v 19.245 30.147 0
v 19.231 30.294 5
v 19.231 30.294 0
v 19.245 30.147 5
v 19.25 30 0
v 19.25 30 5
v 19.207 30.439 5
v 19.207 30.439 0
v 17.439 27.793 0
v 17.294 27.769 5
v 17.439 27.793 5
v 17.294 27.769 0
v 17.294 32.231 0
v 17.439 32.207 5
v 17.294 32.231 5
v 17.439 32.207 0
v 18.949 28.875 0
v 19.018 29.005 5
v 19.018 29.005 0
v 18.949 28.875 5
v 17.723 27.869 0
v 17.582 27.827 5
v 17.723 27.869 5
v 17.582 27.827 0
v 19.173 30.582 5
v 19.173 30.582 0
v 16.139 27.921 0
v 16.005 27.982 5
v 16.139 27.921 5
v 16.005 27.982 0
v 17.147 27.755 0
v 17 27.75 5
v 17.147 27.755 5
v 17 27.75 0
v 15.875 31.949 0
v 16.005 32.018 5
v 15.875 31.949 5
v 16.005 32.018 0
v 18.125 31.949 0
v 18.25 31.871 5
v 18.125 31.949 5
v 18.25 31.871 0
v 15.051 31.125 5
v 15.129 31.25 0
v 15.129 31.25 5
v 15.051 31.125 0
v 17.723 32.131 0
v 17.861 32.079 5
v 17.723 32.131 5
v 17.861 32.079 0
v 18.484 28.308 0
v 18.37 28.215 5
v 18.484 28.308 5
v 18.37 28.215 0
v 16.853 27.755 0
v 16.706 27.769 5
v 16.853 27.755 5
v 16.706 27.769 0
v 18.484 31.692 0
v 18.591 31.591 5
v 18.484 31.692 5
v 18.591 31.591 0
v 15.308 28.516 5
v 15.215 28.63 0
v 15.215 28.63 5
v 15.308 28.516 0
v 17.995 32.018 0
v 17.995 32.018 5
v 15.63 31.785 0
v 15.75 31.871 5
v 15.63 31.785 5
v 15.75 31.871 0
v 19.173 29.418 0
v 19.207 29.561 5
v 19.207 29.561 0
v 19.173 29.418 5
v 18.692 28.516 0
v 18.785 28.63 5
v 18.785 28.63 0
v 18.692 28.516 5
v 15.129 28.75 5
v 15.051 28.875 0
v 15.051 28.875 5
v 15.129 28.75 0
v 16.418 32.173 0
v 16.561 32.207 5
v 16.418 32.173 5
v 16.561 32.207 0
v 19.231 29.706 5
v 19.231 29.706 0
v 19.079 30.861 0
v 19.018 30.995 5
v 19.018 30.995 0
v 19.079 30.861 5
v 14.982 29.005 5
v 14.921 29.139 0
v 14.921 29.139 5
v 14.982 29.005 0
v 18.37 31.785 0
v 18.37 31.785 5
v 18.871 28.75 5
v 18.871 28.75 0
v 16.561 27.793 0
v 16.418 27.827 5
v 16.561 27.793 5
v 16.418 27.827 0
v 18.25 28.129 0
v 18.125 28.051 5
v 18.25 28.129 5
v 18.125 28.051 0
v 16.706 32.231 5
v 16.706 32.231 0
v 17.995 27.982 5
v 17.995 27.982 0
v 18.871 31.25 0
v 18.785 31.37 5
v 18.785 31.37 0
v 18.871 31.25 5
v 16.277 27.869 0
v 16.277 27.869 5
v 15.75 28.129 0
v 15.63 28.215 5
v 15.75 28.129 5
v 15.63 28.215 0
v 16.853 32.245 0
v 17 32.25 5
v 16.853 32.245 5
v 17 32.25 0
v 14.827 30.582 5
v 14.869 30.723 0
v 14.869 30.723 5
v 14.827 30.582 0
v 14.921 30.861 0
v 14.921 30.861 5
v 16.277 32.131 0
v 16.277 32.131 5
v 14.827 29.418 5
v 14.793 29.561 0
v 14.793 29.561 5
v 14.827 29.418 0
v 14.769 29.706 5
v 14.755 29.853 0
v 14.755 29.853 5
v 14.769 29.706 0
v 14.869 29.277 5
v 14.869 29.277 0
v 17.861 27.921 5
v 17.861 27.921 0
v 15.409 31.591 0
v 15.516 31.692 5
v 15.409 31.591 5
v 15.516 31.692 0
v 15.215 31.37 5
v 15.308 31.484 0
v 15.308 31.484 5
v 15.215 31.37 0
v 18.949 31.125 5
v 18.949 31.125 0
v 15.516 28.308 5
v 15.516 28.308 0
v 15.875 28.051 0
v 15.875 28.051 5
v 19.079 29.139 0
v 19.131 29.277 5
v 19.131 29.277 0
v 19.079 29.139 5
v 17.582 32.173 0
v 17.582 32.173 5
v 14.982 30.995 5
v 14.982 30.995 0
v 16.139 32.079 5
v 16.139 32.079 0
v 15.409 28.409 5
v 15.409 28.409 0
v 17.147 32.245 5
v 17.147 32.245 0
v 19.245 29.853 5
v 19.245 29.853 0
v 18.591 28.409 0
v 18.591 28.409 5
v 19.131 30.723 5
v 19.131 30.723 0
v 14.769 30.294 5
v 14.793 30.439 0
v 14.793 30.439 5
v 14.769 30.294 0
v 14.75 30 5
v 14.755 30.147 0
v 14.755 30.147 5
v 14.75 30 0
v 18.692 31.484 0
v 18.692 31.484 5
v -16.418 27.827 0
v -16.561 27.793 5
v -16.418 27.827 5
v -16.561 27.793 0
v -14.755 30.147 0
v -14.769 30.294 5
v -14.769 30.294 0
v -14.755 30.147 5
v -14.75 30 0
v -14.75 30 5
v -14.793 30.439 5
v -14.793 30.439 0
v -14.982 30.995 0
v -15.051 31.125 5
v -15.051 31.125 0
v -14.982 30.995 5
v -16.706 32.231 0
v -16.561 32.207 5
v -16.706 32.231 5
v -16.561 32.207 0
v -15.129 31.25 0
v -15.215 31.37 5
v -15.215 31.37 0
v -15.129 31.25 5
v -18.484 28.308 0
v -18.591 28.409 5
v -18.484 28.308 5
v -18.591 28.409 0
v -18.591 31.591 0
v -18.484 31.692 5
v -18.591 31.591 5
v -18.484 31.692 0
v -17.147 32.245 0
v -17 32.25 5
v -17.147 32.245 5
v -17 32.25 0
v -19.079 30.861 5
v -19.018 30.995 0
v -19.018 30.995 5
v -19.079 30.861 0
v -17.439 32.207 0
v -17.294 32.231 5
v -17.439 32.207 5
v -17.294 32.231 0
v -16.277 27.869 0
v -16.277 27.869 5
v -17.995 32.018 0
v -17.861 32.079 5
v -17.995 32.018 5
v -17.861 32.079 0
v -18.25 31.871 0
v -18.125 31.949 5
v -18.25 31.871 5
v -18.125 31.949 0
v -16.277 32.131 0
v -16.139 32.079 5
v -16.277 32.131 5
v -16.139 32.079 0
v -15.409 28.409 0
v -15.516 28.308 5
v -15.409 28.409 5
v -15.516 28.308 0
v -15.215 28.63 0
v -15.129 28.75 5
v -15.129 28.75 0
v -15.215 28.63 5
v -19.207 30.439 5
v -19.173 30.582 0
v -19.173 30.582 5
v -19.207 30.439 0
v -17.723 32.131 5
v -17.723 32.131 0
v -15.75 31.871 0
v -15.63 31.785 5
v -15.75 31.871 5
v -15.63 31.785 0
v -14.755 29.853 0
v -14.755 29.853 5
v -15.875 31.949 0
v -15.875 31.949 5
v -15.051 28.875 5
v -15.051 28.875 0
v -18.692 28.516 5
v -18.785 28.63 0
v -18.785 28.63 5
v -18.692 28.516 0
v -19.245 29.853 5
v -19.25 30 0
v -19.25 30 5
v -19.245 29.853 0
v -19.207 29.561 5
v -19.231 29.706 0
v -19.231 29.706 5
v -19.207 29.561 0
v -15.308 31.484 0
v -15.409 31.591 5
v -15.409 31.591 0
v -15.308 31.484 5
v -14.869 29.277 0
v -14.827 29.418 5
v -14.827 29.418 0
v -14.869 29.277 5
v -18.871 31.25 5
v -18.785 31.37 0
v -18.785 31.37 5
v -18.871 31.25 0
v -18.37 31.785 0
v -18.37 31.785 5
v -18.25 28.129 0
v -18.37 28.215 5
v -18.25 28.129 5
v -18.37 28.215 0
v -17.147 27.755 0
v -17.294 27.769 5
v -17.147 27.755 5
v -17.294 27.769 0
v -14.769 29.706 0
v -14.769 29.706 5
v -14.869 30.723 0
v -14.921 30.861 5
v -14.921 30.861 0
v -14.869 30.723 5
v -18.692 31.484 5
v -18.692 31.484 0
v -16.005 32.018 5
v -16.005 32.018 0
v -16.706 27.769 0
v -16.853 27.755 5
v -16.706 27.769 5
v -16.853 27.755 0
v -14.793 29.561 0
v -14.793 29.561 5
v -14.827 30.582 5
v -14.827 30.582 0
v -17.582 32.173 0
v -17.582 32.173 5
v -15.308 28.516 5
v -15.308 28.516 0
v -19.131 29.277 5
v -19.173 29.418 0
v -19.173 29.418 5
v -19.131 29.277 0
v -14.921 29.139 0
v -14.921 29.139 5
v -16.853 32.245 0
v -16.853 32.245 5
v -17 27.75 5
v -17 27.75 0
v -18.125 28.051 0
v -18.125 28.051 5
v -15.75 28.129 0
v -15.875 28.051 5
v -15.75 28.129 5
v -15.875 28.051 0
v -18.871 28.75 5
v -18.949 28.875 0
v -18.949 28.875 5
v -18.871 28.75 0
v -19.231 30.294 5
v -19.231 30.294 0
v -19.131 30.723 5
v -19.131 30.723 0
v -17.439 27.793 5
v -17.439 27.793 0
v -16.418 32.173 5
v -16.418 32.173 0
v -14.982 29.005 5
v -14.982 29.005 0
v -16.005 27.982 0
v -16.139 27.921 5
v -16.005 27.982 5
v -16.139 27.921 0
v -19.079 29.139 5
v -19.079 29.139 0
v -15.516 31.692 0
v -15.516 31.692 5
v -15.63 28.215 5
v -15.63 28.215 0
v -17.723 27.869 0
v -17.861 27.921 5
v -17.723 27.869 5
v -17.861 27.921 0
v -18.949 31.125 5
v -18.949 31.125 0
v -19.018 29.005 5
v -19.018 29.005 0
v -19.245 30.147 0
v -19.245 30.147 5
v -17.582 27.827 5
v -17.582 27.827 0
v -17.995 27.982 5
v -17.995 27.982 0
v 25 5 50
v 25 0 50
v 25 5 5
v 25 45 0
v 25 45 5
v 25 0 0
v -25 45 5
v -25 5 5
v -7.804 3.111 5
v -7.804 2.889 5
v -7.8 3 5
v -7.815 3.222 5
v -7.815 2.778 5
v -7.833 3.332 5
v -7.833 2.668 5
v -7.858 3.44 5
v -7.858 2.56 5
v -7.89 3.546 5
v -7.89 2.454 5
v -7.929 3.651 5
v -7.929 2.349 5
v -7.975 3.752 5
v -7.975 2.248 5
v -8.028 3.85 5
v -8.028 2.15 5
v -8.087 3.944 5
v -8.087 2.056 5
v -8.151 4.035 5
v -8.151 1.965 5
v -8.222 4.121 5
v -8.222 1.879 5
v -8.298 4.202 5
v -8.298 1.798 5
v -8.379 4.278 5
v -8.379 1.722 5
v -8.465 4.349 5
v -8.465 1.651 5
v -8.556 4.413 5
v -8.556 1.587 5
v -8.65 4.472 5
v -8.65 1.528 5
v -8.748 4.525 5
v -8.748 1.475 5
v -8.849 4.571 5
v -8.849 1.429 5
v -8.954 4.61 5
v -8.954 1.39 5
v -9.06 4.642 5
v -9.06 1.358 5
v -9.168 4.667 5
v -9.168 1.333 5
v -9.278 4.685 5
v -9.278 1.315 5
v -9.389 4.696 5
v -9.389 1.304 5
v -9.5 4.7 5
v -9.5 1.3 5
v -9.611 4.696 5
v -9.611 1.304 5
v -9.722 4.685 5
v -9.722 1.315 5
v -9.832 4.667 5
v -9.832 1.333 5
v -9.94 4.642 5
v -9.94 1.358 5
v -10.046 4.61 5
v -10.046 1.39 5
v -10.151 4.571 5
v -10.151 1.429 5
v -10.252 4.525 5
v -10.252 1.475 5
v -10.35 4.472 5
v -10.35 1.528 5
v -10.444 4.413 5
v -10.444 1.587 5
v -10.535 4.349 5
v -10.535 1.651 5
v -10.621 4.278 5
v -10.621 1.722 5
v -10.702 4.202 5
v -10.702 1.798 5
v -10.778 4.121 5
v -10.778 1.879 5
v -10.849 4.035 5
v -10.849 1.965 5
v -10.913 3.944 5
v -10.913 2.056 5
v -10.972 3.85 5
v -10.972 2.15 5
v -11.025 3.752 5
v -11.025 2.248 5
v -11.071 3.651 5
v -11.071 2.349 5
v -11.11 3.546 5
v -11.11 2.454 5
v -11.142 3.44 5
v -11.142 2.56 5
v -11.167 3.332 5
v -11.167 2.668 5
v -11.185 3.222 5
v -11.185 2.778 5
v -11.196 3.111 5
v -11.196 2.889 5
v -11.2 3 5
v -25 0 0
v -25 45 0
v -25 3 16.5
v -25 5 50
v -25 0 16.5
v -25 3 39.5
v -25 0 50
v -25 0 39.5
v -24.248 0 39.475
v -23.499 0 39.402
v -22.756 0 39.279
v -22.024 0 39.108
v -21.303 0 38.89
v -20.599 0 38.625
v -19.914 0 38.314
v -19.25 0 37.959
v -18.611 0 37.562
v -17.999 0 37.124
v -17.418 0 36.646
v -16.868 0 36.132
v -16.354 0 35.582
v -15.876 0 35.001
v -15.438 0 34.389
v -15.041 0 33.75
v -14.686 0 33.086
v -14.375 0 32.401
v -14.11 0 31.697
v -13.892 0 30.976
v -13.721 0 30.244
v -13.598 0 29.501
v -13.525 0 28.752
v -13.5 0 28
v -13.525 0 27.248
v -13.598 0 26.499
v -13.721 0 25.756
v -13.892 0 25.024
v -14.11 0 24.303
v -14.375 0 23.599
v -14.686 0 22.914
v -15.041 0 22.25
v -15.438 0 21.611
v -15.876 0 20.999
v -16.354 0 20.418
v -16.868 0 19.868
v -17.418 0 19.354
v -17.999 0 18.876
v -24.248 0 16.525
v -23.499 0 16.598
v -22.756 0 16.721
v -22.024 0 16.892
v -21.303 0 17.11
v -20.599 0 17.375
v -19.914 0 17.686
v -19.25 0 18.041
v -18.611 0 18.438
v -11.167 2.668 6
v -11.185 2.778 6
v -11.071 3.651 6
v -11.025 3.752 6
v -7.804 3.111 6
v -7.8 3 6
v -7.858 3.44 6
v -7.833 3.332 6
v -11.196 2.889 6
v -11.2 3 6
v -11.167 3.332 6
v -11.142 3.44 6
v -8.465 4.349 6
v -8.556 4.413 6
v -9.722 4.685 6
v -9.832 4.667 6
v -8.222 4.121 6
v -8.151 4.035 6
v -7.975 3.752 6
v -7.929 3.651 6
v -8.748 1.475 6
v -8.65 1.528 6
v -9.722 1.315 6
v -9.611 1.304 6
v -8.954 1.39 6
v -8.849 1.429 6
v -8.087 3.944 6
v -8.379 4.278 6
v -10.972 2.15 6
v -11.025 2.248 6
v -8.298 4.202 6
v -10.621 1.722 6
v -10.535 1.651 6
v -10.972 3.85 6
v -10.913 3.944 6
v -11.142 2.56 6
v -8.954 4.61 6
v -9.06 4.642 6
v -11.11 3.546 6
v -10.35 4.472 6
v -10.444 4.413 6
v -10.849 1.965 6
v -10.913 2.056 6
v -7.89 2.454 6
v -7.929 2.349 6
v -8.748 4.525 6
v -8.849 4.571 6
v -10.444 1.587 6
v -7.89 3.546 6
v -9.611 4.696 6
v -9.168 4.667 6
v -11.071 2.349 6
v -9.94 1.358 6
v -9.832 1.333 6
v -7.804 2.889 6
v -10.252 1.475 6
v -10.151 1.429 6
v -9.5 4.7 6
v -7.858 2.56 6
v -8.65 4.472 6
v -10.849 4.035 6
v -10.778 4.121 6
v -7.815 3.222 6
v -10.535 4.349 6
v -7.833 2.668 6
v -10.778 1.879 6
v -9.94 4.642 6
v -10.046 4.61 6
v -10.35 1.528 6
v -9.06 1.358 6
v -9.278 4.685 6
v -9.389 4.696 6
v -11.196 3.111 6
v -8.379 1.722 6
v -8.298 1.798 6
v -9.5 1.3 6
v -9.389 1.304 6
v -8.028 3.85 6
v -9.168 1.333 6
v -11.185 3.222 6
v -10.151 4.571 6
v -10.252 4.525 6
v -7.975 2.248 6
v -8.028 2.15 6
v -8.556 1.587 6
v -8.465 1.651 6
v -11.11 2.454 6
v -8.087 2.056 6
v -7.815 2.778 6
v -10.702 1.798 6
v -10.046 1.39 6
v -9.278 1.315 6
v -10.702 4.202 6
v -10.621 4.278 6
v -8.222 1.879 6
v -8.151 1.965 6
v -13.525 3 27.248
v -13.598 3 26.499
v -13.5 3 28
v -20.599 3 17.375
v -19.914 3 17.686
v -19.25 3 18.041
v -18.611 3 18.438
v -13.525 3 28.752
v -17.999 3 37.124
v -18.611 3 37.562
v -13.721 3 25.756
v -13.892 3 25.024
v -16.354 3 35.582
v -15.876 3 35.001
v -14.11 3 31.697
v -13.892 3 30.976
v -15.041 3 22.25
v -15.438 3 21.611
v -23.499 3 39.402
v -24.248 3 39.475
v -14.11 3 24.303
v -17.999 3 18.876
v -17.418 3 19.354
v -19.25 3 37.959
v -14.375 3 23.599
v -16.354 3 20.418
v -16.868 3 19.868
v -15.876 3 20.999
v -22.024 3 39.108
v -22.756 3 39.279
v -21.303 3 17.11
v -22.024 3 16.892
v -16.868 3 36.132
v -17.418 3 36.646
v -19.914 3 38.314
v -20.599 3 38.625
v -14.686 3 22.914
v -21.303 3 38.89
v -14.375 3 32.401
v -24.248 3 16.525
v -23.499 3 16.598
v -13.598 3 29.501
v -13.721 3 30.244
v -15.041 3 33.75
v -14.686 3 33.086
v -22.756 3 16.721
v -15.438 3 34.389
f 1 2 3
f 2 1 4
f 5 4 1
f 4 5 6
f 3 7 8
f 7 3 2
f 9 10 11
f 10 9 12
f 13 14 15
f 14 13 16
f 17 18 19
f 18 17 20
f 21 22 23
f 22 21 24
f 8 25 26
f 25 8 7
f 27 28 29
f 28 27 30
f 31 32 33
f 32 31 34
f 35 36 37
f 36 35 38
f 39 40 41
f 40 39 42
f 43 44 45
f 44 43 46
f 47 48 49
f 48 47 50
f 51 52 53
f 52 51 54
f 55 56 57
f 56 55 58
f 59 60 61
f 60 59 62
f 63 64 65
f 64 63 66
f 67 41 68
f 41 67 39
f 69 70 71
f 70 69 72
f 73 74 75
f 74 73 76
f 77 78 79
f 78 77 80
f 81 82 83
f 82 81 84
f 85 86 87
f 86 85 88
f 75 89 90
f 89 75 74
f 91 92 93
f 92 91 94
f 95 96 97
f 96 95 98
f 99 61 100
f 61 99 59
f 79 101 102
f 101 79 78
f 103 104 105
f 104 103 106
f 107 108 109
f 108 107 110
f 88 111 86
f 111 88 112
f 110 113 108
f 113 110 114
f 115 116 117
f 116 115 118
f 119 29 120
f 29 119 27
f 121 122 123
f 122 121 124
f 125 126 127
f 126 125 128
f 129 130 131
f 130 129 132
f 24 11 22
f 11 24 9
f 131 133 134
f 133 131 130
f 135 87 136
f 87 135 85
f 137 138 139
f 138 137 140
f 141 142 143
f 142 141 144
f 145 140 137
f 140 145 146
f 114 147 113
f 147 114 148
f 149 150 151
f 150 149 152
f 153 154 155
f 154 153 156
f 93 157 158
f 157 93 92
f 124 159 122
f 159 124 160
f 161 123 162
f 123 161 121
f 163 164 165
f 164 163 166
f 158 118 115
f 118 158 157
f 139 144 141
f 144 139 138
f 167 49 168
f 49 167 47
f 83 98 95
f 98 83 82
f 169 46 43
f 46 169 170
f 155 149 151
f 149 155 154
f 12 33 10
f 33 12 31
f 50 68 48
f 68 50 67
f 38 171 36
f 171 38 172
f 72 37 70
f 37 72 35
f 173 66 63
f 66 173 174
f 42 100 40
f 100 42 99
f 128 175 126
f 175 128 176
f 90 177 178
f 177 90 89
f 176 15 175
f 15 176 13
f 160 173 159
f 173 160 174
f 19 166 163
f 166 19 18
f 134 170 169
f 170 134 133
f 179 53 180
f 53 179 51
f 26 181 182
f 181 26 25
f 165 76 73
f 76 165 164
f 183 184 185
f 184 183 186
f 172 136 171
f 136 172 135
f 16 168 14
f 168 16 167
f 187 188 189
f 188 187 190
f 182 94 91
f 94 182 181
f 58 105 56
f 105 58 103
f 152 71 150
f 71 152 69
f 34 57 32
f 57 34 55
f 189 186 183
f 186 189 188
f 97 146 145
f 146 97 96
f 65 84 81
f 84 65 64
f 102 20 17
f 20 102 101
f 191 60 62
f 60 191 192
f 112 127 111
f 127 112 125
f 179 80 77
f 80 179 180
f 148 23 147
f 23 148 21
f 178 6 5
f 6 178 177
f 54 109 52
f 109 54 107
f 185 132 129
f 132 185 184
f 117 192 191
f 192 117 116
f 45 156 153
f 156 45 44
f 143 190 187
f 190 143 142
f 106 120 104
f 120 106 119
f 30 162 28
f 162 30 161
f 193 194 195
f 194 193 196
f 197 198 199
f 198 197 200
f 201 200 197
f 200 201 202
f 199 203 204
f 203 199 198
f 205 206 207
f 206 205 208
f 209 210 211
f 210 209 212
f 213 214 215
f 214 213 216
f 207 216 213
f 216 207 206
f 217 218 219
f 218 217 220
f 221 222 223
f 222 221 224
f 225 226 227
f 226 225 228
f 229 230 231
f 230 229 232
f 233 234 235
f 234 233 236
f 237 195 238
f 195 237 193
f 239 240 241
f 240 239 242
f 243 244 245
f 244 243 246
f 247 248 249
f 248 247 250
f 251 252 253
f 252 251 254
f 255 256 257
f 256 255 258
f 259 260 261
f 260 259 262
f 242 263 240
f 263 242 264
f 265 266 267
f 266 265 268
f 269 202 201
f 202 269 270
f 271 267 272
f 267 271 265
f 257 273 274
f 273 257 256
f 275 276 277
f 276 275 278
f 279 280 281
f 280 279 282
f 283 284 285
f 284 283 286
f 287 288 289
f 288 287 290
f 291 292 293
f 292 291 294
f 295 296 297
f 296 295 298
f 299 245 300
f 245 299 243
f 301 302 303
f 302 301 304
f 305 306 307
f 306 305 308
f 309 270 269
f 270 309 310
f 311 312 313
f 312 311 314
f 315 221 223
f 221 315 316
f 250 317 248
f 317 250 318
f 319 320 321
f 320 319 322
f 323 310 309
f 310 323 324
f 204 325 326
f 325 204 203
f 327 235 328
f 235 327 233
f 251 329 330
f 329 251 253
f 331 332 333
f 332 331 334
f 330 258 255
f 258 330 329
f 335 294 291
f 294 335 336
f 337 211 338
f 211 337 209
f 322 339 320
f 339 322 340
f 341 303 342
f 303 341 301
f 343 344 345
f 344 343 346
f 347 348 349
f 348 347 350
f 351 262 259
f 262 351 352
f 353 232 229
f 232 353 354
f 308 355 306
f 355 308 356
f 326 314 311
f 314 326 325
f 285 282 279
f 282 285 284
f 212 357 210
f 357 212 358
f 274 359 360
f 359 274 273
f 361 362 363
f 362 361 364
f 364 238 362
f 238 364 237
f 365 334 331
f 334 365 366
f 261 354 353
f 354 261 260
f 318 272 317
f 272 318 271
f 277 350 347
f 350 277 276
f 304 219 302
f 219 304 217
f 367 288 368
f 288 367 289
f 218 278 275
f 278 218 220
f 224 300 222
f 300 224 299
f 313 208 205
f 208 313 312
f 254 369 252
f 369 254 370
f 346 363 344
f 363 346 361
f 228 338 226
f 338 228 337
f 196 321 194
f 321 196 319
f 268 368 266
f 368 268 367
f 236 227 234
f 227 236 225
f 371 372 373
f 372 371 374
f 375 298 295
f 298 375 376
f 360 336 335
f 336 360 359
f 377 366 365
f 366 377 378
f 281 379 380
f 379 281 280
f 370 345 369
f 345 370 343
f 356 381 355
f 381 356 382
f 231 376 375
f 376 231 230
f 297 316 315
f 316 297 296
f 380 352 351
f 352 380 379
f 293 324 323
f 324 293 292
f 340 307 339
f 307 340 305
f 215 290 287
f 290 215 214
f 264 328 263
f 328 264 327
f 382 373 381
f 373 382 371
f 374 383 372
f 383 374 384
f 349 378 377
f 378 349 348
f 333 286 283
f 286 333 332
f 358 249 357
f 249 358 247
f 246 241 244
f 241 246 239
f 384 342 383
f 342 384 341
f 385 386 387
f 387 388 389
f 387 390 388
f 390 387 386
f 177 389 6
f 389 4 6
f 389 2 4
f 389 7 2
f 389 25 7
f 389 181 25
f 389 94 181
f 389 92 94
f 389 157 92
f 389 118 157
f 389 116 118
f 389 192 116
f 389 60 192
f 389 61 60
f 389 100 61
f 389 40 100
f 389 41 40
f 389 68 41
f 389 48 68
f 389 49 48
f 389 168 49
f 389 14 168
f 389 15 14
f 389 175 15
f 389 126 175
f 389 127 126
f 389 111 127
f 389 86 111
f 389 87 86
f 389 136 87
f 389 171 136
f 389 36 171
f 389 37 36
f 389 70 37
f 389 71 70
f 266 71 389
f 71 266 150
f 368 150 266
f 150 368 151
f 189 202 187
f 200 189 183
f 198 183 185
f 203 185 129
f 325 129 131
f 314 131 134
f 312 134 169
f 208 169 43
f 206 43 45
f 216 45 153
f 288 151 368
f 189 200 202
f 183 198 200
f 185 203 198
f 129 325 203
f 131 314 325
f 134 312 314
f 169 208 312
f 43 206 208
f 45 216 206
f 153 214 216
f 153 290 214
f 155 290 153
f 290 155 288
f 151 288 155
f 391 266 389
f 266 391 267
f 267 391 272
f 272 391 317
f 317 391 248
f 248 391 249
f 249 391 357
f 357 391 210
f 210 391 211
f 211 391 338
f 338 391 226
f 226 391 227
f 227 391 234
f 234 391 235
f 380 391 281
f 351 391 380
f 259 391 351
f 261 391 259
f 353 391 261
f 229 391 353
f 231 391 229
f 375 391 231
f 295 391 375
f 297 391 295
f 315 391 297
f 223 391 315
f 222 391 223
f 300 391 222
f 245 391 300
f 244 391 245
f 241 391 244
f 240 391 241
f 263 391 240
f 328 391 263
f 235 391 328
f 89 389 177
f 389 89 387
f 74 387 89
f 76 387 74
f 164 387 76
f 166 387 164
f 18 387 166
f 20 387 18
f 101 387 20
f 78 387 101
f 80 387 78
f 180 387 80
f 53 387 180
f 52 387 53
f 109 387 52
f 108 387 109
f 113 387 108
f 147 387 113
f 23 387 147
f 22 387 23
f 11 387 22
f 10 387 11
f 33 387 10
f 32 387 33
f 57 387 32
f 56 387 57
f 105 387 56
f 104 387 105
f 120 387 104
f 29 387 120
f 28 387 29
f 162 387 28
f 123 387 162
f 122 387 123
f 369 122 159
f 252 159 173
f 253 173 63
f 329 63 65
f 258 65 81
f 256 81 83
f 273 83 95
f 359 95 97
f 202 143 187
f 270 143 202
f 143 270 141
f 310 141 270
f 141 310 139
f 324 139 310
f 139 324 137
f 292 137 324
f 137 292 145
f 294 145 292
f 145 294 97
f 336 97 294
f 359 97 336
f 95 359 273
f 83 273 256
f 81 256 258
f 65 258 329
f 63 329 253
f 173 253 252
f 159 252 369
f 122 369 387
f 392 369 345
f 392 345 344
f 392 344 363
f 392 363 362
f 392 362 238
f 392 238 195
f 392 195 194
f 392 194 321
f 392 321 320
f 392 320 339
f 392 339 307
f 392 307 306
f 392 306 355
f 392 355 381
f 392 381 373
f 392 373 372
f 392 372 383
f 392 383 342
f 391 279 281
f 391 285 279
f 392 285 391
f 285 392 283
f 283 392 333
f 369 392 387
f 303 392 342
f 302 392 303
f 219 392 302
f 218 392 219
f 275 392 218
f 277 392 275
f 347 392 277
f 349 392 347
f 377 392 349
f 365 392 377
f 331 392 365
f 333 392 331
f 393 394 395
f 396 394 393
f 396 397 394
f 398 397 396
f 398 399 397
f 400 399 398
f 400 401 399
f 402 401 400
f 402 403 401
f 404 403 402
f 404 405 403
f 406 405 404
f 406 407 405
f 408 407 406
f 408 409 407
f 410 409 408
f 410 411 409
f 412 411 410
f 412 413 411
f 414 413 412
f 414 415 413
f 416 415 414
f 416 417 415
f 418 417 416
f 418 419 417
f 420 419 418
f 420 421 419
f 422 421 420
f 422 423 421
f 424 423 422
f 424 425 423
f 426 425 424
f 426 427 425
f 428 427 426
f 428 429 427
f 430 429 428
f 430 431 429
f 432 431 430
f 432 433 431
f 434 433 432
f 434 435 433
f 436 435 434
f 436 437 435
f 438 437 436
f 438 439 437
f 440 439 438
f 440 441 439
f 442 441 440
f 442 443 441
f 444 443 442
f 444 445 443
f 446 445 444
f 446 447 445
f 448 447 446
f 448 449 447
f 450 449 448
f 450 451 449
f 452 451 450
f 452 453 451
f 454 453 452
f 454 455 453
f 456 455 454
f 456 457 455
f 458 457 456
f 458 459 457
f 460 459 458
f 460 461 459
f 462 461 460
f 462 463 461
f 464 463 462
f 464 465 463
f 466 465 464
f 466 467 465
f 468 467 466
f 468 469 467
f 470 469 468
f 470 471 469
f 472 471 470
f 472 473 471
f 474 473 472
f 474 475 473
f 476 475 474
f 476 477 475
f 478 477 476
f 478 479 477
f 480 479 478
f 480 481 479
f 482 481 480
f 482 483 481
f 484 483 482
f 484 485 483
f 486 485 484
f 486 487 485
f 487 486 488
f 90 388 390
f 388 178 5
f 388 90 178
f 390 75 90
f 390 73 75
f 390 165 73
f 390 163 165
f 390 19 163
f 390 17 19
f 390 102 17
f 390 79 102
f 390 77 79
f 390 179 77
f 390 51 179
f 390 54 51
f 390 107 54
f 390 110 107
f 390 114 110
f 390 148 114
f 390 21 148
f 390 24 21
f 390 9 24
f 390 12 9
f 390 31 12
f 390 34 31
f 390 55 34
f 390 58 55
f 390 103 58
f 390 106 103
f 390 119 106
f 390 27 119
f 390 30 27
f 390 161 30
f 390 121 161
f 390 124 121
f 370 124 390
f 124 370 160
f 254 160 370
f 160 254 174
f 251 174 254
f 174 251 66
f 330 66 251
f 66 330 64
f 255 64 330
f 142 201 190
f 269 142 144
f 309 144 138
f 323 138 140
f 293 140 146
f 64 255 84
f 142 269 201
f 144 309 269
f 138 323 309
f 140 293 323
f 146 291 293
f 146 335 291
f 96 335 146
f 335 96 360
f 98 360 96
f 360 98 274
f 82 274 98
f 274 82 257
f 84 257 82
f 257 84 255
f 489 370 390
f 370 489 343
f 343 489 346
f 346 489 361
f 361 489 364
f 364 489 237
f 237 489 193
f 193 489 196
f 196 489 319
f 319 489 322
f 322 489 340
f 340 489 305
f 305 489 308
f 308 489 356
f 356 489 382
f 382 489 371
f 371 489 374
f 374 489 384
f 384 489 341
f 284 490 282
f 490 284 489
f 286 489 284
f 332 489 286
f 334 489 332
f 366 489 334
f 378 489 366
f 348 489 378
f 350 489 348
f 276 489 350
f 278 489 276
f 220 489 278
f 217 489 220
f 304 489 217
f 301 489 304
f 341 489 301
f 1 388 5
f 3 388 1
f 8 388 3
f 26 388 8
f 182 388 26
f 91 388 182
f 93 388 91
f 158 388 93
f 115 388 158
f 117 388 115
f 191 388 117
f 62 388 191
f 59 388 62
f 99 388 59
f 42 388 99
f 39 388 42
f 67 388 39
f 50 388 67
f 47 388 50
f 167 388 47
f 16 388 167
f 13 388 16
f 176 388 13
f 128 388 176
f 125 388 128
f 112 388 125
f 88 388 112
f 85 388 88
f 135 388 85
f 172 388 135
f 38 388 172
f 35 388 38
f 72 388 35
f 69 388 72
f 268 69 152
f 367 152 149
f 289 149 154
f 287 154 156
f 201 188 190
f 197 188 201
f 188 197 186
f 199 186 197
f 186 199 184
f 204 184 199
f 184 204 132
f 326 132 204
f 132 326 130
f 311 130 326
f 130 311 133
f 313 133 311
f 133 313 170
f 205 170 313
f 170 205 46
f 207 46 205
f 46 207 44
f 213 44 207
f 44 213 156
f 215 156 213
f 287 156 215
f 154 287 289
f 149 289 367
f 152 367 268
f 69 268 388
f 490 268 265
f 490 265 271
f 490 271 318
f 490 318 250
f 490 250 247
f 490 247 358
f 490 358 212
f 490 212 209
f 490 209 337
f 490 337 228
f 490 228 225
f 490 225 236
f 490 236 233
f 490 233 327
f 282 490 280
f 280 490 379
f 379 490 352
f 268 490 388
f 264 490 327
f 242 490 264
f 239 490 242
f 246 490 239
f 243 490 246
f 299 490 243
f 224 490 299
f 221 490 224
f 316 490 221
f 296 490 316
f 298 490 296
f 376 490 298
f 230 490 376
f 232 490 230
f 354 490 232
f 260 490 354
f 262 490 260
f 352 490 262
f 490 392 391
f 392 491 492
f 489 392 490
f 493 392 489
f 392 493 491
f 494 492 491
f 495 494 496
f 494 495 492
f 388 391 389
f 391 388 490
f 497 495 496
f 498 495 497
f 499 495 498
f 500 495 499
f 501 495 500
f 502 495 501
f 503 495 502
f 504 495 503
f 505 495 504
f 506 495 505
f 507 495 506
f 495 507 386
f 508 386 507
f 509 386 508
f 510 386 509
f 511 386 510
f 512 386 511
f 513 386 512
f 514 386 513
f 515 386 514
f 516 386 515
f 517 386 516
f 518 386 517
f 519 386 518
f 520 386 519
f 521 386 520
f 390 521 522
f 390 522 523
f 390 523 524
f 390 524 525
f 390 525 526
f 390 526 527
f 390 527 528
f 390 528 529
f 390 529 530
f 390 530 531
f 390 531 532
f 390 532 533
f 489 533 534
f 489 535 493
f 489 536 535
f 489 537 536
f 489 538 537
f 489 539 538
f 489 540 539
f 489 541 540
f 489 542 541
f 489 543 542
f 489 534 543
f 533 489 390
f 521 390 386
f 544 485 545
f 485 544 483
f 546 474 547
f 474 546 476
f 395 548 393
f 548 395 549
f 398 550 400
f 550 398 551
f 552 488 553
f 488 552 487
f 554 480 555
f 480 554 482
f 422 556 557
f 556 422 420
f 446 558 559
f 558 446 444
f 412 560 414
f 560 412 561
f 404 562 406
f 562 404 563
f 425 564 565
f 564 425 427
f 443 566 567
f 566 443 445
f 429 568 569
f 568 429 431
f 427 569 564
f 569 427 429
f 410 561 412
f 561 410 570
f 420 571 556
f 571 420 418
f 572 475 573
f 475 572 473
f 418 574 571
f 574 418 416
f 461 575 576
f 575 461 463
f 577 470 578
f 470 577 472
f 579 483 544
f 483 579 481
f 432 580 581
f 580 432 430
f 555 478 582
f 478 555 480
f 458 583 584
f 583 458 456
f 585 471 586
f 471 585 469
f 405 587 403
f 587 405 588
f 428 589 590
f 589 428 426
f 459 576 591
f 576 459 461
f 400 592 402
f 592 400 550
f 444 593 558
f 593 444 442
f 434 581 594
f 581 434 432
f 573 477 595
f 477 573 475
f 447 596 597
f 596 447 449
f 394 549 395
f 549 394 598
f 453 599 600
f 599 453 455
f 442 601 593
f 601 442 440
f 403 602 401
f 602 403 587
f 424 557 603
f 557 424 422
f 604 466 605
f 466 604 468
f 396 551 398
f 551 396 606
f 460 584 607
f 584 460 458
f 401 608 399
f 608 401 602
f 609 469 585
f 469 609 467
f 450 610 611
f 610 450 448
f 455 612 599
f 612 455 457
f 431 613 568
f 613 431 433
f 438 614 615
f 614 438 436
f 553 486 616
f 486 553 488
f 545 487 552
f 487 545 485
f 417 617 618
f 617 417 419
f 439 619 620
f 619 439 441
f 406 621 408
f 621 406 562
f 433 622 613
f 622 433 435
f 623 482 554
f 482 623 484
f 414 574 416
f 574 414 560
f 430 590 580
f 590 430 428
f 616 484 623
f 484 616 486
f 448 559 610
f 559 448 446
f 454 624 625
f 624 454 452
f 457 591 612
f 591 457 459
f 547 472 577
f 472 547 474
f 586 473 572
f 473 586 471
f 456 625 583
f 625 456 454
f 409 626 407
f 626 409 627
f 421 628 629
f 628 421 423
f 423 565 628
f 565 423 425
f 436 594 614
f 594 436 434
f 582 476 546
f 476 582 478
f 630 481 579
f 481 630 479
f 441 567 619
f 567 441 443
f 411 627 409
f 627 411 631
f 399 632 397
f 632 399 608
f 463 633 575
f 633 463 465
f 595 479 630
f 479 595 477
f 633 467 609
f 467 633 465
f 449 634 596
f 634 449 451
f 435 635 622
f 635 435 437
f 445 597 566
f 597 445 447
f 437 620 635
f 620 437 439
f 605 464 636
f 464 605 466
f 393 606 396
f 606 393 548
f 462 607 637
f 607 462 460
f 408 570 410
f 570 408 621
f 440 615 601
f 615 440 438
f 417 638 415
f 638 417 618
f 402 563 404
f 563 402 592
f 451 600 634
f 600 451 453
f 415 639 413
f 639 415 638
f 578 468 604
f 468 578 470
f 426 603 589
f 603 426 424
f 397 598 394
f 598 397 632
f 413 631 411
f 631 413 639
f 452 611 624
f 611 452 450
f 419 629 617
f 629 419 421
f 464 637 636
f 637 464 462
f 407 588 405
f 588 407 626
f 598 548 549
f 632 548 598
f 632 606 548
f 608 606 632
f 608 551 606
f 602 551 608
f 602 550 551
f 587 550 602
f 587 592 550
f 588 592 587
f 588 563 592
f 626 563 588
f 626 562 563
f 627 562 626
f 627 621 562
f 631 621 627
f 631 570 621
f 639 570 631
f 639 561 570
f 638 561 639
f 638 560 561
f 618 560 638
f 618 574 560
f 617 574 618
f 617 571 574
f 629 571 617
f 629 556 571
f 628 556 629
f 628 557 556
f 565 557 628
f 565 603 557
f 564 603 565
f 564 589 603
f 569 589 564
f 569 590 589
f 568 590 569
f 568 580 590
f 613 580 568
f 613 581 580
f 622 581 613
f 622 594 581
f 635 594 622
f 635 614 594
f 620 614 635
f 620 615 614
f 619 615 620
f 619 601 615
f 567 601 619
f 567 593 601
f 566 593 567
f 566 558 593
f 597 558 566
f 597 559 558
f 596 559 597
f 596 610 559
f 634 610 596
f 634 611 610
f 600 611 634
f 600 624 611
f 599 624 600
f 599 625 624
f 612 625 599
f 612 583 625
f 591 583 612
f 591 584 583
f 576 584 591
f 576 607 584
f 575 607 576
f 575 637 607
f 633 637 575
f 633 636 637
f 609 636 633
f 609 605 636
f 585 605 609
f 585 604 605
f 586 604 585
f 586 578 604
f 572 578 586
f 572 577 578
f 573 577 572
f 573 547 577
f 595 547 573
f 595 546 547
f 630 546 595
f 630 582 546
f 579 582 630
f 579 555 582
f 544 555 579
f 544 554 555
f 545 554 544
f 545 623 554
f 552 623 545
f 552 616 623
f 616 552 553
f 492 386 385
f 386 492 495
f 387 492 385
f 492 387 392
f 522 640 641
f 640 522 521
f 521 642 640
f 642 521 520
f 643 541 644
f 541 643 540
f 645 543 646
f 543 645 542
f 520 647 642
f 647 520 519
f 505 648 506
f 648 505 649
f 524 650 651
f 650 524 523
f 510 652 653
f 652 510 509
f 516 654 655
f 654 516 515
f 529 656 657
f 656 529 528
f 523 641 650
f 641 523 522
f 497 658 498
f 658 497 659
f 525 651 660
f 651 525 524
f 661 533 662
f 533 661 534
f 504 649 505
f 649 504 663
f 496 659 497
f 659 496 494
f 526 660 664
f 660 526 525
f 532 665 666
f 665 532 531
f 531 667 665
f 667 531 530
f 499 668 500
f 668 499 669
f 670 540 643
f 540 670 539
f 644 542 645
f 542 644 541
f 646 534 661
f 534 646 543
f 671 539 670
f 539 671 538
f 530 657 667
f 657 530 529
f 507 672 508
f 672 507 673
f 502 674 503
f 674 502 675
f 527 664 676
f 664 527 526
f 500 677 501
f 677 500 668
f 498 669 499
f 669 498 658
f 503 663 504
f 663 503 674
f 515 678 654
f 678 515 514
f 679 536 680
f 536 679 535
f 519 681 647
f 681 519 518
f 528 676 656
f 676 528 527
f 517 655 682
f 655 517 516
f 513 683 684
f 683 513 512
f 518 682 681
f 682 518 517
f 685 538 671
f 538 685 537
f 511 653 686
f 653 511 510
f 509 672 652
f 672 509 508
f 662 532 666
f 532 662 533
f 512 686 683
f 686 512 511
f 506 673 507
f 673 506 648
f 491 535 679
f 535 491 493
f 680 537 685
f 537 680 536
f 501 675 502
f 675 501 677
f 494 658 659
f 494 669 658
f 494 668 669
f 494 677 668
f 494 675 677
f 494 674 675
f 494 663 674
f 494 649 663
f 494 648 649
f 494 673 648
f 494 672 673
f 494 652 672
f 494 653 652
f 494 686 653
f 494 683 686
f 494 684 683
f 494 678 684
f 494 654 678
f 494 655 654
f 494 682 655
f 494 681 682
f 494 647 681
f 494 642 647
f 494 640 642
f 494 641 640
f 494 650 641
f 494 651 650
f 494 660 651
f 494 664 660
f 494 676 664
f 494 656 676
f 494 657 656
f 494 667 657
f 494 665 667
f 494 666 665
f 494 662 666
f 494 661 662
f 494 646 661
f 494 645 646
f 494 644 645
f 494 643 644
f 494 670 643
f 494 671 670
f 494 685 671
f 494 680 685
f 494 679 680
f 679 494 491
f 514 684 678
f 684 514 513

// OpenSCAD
// L-shaped mounting bracket for a NEMA 17 stepper motor (e.g. syringe pump)
// Print orientation: base plate on the bed, motor plate building up in +Z

// ---------------- Parameters ----------------
plate_w      = 50;    // base plate length (X)
plate_h      = 45;    // base plate width (Y)
plate_t      = 5;     // base plate thickness (Z)

hole_m4_x    = -17;   // M4 through-hole X position (back edge)
hole_m4_y    = 30;    // M4 through-hole Y position
hole_m4_d    = 4.5;   // M4 through-hole diameter

motor_w      = 50;    // motor plate length (X)
motor_h      = 5;     // motor plate width (Y)
motor_z      = 50;    // motor plate height (Z)

boss_d       = 23;    // motor centring boss hole diameter
boss_x       = 0;     // boss hole X centre
boss_z       = 28;    // boss hole Z centre

screw_d      = 3.4;   // M3 screw hole diameter
screw_pitch  = 31;    // square pattern side length

gusset_t     = 5;     // gusset thickness (X)
gusset_leg   = 20;    // gusset leg length (Y and Z)

eps          = 0.5;   // cutter overshoot past faces
$fn          = 96;    // curve resolution

// ---------------- Model ----------------
union() {
    // Base plate with M4 through-holes
    difference() {
        translate([-plate_w/2, 0, 0])
            cube([plate_w, plate_h, plate_t]);
        for (sx = [-1, 1])
            translate([sx * hole_m4_x, hole_m4_y, -eps])
                cylinder(d = hole_m4_d, h = plate_t + 2*eps);
    }

    // Vertical motor plate with boss hole and M3 screw holes
    translate([-motor_w/2, 0, 0])
        difference() {
            cube([motor_w, motor_h, motor_z]);
            translate([boss_x, -motor_h/2 - eps, boss_z])
                rotate([-90, 0, 0])
                    cylinder(d = boss_d, h = motor_h + 2*eps);
            for (a = [0, 90, 180, 270])
                rotate([0, 0, a])
                    translate([-screw_pitch/2, -motor_h/2 - eps, 0])
                        cylinder(d = screw_d, h = motor_h + 2*eps);
        }

    // Gussets on the left and right edges
    for (sx = [-1, 1])
        translate([sx * (motor_w/2 - gusset_t), 0, 0])
            // right triangle in YZ, extruded along X
            linear_extrude(height = gusset_t)
                translate([0, 5, 5])
                    cube([gusset_t, gusset_leg, gusset_leg]);
}
